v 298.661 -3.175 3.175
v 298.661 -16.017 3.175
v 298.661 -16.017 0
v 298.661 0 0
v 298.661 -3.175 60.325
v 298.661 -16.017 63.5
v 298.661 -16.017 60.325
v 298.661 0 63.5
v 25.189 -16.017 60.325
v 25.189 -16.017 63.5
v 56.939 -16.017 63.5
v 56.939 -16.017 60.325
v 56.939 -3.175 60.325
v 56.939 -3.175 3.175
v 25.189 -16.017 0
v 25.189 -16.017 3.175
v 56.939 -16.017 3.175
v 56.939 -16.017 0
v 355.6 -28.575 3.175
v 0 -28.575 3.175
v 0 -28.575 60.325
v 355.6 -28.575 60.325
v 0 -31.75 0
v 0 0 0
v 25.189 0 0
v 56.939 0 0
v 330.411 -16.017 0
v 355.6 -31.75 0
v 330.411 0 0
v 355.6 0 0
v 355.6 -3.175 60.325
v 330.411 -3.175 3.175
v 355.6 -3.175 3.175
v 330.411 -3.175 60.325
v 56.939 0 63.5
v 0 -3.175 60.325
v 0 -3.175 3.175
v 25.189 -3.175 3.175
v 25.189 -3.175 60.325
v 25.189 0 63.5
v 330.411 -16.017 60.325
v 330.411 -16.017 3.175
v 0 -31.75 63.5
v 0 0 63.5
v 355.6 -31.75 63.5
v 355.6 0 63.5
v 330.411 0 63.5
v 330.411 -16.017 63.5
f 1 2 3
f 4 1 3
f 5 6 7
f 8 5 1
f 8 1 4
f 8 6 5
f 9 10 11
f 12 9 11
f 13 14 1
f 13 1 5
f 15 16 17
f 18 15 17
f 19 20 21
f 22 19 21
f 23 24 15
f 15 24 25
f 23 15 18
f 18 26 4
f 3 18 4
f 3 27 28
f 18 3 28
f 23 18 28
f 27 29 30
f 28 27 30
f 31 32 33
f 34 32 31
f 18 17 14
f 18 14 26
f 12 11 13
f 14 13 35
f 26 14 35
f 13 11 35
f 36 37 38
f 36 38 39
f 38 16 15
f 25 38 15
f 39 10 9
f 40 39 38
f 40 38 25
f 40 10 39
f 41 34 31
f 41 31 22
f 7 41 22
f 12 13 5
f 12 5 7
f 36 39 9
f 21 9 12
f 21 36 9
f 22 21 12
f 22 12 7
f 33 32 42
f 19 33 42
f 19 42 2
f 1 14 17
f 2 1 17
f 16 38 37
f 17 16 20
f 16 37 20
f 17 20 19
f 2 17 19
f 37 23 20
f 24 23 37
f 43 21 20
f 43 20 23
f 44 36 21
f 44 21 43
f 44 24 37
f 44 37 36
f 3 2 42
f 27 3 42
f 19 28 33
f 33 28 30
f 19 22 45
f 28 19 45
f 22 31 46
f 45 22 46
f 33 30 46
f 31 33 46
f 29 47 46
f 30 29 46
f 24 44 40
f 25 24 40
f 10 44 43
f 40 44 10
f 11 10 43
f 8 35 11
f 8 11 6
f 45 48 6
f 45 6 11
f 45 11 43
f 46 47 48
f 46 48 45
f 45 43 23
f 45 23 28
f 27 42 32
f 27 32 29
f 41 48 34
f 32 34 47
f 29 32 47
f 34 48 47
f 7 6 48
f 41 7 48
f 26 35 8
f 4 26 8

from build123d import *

# Parameters (mm, degrees)
F0_W     = 355.6
F0_H     = 63.5
F1_DEPTH = 31.75
F2_W     = 31.75
F2_H     = 16.01724
F3_DEPTH = 63.501
F4_W     = 25.4
F4_H     = 57.15
F5_DEPTH = 355.601


with BuildPart() as f1:
    # F0 (on Front) → F1 (new body)
    with BuildSketch(Plane.XZ):
        with Locations((177.8, 31.75)):
            Rectangle(F0_W, F0_H)
    extrude(amount=F1_DEPTH)

    # F2 (on face) → F3 (cut, through all)
    with BuildSketch(Plane.XY.offset(63.5)):
        with Locations((41.06418, -8.00862)):
            Rectangle(F2_W, F2_H)
        with Locations((314.53582, -8.00862)):
            Rectangle(F2_W, F2_H)
    extrude(amount=-F3_DEPTH, mode=Mode.SUBTRACT)

    # F4 (on face) → F5 (cut, through all)
    with BuildSketch(Plane(origin=(0, 0, 0), x_dir=(0, -1, 0), z_dir=(-1, 0, 0))):
        with Locations((15.875, 31.75)):
            Rectangle(F4_W, F4_H)
    extrude(amount=-F5_DEPTH, mode=Mode.SUBTRACT)


solid = f1.part
